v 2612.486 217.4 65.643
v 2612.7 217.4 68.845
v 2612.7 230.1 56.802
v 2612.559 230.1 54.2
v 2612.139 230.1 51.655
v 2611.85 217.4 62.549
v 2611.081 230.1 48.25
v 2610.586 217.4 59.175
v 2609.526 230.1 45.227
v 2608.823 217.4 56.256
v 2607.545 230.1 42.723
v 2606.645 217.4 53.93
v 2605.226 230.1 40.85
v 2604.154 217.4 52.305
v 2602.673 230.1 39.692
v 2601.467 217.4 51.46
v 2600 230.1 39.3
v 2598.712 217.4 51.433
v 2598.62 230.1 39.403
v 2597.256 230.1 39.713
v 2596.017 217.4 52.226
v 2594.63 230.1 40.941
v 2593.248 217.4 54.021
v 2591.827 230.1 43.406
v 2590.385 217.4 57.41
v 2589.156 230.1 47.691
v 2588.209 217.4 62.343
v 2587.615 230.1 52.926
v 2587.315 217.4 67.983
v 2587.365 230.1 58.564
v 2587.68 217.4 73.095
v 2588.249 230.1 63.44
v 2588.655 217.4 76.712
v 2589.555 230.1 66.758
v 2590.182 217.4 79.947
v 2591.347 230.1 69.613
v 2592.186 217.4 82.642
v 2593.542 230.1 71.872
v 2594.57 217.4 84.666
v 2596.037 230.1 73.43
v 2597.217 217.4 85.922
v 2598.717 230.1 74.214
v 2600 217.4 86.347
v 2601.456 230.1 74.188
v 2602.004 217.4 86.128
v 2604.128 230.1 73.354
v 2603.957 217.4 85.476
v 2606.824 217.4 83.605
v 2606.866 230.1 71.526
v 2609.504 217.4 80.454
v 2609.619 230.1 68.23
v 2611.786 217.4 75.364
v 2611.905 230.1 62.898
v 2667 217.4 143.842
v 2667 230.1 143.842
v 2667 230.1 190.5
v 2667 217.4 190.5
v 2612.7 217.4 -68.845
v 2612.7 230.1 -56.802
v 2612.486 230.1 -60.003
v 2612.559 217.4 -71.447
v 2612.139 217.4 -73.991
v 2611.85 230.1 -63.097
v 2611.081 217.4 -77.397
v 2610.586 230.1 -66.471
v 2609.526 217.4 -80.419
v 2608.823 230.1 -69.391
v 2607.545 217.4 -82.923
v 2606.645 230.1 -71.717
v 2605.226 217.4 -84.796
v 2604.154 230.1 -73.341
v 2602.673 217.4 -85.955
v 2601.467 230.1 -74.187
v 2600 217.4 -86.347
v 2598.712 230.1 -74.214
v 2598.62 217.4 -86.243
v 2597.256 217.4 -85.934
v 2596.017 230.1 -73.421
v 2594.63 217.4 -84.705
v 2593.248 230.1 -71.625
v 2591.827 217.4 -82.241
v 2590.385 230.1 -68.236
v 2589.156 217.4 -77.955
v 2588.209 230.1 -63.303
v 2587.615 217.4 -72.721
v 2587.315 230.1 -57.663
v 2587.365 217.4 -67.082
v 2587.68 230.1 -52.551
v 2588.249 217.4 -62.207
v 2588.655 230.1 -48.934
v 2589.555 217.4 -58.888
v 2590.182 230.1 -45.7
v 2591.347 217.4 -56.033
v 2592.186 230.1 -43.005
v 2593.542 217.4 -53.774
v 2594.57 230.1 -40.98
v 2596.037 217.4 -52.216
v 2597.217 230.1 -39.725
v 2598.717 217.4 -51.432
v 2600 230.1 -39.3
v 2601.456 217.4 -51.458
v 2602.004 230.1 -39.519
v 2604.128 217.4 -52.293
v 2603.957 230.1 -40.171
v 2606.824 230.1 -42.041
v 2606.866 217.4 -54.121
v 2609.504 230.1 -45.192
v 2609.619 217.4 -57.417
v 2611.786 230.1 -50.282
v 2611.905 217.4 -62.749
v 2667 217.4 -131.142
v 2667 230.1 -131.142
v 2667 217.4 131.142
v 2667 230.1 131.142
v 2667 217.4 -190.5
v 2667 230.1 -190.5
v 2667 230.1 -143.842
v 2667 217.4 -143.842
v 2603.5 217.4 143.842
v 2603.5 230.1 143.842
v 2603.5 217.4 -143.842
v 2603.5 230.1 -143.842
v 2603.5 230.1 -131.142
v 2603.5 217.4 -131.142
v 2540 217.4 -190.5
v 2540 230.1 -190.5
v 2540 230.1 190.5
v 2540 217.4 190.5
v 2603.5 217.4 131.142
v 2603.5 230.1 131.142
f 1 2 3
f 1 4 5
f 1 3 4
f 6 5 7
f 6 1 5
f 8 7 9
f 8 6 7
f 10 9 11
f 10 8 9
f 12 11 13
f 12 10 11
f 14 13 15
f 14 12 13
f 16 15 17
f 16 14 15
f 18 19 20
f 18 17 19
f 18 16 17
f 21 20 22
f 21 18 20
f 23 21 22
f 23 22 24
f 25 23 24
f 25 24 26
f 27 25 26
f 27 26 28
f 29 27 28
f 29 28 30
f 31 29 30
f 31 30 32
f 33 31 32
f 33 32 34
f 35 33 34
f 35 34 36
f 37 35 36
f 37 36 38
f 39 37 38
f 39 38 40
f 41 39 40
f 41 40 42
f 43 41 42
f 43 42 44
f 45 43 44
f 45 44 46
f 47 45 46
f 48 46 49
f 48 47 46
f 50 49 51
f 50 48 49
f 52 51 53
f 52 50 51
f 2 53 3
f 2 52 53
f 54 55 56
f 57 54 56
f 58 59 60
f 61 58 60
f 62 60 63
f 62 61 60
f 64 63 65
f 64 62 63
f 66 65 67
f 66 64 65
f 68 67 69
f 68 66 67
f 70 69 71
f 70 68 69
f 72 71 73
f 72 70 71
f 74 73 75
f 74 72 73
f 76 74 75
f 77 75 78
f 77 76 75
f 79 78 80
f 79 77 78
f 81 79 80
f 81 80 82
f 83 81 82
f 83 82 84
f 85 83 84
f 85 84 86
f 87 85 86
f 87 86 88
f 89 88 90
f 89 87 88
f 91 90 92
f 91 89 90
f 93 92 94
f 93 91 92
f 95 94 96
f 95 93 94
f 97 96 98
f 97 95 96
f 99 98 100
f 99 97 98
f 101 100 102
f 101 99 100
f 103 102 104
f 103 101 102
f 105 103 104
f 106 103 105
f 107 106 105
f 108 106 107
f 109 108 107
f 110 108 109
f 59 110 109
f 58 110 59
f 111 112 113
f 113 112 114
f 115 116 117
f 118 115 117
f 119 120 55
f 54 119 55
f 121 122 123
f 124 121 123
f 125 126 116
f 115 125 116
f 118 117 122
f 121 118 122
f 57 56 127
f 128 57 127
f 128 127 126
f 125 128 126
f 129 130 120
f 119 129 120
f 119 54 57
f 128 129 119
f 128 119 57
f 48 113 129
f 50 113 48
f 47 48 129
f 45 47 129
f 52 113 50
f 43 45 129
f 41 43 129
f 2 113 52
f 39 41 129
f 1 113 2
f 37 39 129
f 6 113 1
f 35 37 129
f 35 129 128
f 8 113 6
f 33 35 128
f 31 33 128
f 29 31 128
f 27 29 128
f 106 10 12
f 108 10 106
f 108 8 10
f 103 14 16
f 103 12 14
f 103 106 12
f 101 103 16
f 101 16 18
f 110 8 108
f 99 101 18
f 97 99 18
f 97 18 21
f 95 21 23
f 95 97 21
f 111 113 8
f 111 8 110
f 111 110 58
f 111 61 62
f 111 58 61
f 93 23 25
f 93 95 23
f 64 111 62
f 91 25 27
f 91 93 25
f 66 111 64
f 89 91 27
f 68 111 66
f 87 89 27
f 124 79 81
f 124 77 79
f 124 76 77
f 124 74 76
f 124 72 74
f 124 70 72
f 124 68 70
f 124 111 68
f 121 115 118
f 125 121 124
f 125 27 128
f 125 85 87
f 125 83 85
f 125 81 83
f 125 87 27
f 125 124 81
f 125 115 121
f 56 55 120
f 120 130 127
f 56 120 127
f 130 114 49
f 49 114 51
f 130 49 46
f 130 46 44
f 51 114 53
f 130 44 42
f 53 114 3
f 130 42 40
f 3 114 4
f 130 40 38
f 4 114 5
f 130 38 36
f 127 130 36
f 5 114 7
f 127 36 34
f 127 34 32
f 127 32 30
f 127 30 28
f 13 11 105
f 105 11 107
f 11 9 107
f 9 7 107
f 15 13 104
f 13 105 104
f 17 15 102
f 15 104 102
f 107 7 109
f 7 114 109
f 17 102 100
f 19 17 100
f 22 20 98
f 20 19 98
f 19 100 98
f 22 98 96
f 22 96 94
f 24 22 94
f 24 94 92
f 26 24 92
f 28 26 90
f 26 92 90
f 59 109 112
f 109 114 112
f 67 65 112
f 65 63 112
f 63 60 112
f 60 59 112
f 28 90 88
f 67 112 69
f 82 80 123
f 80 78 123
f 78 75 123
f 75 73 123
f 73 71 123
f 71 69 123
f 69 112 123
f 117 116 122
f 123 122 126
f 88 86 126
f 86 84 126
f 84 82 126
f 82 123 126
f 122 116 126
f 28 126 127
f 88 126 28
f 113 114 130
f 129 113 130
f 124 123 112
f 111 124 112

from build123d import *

# Parameters (mm, degrees)
BOSS_EXTRUDE1_DEPTH = 12.7
CAVITY1_START       = 98.335975301
CAVITY1_OUTLINE_R   = 12.7
CAVITY1_DEPTH       = 41.588388123
CAVITY1_2_OUTLINE_R = 12.7
CAVITY1_2_DEPTH     = 41.588388123


# Read off the part's stored shape, not the designer's step: Cavity1
with BuildPart() as part:
    # Sketch2 → Boss-Extrude1 (new body)
    with BuildSketch(Plane(origin=(0, 230.1, 0), x_dir=(1, 0, 0), z_dir=(0, 1, 0))):
        Polygon((2540, 190.5), (2667, 190.5), (2667, 143.842086105), (2603.5, 143.842086105), (2603.5, 131.142086105), (2667, 131.142086105), (2667, -131.142086105), (2603.5, -131.142086105), (2603.5, -143.842086105), (2667, -143.842086105), (2667, -190.5), (2540, -190.5), align=None)
    extrude(amount=-BOSS_EXTRUDE1_DEPTH)

    # Cavity1 outline → Cavity1 (cut)
    with BuildSketch(Plane(origin=(0, 0, 0), x_dir=(1, 0, 0), z_dir=(0, 0.7256238511734343, -0.6880915830092923)).offset(CAVITY1_START)):
        with Locations((2600, -199.546559073)):
            Circle(CAVITY1_OUTLINE_R)
    extrude(amount=CAVITY1_DEPTH, mode=Mode.SUBTRACT)

    # Cavity1 2 outline → Cavity1 2 (cut)
    with BuildSketch(Plane(origin=(0, 0, 0), x_dir=(1, 0, 0), z_dir=(0, 0.7256238511734294, 0.6880915830092974)).offset(CAVITY1_START)):
        with Locations((2600, 199.546559073)):
            Circle(CAVITY1_2_OUTLINE_R)
    extrude(amount=CAVITY1_2_DEPTH, mode=Mode.SUBTRACT)


solid = part.part
